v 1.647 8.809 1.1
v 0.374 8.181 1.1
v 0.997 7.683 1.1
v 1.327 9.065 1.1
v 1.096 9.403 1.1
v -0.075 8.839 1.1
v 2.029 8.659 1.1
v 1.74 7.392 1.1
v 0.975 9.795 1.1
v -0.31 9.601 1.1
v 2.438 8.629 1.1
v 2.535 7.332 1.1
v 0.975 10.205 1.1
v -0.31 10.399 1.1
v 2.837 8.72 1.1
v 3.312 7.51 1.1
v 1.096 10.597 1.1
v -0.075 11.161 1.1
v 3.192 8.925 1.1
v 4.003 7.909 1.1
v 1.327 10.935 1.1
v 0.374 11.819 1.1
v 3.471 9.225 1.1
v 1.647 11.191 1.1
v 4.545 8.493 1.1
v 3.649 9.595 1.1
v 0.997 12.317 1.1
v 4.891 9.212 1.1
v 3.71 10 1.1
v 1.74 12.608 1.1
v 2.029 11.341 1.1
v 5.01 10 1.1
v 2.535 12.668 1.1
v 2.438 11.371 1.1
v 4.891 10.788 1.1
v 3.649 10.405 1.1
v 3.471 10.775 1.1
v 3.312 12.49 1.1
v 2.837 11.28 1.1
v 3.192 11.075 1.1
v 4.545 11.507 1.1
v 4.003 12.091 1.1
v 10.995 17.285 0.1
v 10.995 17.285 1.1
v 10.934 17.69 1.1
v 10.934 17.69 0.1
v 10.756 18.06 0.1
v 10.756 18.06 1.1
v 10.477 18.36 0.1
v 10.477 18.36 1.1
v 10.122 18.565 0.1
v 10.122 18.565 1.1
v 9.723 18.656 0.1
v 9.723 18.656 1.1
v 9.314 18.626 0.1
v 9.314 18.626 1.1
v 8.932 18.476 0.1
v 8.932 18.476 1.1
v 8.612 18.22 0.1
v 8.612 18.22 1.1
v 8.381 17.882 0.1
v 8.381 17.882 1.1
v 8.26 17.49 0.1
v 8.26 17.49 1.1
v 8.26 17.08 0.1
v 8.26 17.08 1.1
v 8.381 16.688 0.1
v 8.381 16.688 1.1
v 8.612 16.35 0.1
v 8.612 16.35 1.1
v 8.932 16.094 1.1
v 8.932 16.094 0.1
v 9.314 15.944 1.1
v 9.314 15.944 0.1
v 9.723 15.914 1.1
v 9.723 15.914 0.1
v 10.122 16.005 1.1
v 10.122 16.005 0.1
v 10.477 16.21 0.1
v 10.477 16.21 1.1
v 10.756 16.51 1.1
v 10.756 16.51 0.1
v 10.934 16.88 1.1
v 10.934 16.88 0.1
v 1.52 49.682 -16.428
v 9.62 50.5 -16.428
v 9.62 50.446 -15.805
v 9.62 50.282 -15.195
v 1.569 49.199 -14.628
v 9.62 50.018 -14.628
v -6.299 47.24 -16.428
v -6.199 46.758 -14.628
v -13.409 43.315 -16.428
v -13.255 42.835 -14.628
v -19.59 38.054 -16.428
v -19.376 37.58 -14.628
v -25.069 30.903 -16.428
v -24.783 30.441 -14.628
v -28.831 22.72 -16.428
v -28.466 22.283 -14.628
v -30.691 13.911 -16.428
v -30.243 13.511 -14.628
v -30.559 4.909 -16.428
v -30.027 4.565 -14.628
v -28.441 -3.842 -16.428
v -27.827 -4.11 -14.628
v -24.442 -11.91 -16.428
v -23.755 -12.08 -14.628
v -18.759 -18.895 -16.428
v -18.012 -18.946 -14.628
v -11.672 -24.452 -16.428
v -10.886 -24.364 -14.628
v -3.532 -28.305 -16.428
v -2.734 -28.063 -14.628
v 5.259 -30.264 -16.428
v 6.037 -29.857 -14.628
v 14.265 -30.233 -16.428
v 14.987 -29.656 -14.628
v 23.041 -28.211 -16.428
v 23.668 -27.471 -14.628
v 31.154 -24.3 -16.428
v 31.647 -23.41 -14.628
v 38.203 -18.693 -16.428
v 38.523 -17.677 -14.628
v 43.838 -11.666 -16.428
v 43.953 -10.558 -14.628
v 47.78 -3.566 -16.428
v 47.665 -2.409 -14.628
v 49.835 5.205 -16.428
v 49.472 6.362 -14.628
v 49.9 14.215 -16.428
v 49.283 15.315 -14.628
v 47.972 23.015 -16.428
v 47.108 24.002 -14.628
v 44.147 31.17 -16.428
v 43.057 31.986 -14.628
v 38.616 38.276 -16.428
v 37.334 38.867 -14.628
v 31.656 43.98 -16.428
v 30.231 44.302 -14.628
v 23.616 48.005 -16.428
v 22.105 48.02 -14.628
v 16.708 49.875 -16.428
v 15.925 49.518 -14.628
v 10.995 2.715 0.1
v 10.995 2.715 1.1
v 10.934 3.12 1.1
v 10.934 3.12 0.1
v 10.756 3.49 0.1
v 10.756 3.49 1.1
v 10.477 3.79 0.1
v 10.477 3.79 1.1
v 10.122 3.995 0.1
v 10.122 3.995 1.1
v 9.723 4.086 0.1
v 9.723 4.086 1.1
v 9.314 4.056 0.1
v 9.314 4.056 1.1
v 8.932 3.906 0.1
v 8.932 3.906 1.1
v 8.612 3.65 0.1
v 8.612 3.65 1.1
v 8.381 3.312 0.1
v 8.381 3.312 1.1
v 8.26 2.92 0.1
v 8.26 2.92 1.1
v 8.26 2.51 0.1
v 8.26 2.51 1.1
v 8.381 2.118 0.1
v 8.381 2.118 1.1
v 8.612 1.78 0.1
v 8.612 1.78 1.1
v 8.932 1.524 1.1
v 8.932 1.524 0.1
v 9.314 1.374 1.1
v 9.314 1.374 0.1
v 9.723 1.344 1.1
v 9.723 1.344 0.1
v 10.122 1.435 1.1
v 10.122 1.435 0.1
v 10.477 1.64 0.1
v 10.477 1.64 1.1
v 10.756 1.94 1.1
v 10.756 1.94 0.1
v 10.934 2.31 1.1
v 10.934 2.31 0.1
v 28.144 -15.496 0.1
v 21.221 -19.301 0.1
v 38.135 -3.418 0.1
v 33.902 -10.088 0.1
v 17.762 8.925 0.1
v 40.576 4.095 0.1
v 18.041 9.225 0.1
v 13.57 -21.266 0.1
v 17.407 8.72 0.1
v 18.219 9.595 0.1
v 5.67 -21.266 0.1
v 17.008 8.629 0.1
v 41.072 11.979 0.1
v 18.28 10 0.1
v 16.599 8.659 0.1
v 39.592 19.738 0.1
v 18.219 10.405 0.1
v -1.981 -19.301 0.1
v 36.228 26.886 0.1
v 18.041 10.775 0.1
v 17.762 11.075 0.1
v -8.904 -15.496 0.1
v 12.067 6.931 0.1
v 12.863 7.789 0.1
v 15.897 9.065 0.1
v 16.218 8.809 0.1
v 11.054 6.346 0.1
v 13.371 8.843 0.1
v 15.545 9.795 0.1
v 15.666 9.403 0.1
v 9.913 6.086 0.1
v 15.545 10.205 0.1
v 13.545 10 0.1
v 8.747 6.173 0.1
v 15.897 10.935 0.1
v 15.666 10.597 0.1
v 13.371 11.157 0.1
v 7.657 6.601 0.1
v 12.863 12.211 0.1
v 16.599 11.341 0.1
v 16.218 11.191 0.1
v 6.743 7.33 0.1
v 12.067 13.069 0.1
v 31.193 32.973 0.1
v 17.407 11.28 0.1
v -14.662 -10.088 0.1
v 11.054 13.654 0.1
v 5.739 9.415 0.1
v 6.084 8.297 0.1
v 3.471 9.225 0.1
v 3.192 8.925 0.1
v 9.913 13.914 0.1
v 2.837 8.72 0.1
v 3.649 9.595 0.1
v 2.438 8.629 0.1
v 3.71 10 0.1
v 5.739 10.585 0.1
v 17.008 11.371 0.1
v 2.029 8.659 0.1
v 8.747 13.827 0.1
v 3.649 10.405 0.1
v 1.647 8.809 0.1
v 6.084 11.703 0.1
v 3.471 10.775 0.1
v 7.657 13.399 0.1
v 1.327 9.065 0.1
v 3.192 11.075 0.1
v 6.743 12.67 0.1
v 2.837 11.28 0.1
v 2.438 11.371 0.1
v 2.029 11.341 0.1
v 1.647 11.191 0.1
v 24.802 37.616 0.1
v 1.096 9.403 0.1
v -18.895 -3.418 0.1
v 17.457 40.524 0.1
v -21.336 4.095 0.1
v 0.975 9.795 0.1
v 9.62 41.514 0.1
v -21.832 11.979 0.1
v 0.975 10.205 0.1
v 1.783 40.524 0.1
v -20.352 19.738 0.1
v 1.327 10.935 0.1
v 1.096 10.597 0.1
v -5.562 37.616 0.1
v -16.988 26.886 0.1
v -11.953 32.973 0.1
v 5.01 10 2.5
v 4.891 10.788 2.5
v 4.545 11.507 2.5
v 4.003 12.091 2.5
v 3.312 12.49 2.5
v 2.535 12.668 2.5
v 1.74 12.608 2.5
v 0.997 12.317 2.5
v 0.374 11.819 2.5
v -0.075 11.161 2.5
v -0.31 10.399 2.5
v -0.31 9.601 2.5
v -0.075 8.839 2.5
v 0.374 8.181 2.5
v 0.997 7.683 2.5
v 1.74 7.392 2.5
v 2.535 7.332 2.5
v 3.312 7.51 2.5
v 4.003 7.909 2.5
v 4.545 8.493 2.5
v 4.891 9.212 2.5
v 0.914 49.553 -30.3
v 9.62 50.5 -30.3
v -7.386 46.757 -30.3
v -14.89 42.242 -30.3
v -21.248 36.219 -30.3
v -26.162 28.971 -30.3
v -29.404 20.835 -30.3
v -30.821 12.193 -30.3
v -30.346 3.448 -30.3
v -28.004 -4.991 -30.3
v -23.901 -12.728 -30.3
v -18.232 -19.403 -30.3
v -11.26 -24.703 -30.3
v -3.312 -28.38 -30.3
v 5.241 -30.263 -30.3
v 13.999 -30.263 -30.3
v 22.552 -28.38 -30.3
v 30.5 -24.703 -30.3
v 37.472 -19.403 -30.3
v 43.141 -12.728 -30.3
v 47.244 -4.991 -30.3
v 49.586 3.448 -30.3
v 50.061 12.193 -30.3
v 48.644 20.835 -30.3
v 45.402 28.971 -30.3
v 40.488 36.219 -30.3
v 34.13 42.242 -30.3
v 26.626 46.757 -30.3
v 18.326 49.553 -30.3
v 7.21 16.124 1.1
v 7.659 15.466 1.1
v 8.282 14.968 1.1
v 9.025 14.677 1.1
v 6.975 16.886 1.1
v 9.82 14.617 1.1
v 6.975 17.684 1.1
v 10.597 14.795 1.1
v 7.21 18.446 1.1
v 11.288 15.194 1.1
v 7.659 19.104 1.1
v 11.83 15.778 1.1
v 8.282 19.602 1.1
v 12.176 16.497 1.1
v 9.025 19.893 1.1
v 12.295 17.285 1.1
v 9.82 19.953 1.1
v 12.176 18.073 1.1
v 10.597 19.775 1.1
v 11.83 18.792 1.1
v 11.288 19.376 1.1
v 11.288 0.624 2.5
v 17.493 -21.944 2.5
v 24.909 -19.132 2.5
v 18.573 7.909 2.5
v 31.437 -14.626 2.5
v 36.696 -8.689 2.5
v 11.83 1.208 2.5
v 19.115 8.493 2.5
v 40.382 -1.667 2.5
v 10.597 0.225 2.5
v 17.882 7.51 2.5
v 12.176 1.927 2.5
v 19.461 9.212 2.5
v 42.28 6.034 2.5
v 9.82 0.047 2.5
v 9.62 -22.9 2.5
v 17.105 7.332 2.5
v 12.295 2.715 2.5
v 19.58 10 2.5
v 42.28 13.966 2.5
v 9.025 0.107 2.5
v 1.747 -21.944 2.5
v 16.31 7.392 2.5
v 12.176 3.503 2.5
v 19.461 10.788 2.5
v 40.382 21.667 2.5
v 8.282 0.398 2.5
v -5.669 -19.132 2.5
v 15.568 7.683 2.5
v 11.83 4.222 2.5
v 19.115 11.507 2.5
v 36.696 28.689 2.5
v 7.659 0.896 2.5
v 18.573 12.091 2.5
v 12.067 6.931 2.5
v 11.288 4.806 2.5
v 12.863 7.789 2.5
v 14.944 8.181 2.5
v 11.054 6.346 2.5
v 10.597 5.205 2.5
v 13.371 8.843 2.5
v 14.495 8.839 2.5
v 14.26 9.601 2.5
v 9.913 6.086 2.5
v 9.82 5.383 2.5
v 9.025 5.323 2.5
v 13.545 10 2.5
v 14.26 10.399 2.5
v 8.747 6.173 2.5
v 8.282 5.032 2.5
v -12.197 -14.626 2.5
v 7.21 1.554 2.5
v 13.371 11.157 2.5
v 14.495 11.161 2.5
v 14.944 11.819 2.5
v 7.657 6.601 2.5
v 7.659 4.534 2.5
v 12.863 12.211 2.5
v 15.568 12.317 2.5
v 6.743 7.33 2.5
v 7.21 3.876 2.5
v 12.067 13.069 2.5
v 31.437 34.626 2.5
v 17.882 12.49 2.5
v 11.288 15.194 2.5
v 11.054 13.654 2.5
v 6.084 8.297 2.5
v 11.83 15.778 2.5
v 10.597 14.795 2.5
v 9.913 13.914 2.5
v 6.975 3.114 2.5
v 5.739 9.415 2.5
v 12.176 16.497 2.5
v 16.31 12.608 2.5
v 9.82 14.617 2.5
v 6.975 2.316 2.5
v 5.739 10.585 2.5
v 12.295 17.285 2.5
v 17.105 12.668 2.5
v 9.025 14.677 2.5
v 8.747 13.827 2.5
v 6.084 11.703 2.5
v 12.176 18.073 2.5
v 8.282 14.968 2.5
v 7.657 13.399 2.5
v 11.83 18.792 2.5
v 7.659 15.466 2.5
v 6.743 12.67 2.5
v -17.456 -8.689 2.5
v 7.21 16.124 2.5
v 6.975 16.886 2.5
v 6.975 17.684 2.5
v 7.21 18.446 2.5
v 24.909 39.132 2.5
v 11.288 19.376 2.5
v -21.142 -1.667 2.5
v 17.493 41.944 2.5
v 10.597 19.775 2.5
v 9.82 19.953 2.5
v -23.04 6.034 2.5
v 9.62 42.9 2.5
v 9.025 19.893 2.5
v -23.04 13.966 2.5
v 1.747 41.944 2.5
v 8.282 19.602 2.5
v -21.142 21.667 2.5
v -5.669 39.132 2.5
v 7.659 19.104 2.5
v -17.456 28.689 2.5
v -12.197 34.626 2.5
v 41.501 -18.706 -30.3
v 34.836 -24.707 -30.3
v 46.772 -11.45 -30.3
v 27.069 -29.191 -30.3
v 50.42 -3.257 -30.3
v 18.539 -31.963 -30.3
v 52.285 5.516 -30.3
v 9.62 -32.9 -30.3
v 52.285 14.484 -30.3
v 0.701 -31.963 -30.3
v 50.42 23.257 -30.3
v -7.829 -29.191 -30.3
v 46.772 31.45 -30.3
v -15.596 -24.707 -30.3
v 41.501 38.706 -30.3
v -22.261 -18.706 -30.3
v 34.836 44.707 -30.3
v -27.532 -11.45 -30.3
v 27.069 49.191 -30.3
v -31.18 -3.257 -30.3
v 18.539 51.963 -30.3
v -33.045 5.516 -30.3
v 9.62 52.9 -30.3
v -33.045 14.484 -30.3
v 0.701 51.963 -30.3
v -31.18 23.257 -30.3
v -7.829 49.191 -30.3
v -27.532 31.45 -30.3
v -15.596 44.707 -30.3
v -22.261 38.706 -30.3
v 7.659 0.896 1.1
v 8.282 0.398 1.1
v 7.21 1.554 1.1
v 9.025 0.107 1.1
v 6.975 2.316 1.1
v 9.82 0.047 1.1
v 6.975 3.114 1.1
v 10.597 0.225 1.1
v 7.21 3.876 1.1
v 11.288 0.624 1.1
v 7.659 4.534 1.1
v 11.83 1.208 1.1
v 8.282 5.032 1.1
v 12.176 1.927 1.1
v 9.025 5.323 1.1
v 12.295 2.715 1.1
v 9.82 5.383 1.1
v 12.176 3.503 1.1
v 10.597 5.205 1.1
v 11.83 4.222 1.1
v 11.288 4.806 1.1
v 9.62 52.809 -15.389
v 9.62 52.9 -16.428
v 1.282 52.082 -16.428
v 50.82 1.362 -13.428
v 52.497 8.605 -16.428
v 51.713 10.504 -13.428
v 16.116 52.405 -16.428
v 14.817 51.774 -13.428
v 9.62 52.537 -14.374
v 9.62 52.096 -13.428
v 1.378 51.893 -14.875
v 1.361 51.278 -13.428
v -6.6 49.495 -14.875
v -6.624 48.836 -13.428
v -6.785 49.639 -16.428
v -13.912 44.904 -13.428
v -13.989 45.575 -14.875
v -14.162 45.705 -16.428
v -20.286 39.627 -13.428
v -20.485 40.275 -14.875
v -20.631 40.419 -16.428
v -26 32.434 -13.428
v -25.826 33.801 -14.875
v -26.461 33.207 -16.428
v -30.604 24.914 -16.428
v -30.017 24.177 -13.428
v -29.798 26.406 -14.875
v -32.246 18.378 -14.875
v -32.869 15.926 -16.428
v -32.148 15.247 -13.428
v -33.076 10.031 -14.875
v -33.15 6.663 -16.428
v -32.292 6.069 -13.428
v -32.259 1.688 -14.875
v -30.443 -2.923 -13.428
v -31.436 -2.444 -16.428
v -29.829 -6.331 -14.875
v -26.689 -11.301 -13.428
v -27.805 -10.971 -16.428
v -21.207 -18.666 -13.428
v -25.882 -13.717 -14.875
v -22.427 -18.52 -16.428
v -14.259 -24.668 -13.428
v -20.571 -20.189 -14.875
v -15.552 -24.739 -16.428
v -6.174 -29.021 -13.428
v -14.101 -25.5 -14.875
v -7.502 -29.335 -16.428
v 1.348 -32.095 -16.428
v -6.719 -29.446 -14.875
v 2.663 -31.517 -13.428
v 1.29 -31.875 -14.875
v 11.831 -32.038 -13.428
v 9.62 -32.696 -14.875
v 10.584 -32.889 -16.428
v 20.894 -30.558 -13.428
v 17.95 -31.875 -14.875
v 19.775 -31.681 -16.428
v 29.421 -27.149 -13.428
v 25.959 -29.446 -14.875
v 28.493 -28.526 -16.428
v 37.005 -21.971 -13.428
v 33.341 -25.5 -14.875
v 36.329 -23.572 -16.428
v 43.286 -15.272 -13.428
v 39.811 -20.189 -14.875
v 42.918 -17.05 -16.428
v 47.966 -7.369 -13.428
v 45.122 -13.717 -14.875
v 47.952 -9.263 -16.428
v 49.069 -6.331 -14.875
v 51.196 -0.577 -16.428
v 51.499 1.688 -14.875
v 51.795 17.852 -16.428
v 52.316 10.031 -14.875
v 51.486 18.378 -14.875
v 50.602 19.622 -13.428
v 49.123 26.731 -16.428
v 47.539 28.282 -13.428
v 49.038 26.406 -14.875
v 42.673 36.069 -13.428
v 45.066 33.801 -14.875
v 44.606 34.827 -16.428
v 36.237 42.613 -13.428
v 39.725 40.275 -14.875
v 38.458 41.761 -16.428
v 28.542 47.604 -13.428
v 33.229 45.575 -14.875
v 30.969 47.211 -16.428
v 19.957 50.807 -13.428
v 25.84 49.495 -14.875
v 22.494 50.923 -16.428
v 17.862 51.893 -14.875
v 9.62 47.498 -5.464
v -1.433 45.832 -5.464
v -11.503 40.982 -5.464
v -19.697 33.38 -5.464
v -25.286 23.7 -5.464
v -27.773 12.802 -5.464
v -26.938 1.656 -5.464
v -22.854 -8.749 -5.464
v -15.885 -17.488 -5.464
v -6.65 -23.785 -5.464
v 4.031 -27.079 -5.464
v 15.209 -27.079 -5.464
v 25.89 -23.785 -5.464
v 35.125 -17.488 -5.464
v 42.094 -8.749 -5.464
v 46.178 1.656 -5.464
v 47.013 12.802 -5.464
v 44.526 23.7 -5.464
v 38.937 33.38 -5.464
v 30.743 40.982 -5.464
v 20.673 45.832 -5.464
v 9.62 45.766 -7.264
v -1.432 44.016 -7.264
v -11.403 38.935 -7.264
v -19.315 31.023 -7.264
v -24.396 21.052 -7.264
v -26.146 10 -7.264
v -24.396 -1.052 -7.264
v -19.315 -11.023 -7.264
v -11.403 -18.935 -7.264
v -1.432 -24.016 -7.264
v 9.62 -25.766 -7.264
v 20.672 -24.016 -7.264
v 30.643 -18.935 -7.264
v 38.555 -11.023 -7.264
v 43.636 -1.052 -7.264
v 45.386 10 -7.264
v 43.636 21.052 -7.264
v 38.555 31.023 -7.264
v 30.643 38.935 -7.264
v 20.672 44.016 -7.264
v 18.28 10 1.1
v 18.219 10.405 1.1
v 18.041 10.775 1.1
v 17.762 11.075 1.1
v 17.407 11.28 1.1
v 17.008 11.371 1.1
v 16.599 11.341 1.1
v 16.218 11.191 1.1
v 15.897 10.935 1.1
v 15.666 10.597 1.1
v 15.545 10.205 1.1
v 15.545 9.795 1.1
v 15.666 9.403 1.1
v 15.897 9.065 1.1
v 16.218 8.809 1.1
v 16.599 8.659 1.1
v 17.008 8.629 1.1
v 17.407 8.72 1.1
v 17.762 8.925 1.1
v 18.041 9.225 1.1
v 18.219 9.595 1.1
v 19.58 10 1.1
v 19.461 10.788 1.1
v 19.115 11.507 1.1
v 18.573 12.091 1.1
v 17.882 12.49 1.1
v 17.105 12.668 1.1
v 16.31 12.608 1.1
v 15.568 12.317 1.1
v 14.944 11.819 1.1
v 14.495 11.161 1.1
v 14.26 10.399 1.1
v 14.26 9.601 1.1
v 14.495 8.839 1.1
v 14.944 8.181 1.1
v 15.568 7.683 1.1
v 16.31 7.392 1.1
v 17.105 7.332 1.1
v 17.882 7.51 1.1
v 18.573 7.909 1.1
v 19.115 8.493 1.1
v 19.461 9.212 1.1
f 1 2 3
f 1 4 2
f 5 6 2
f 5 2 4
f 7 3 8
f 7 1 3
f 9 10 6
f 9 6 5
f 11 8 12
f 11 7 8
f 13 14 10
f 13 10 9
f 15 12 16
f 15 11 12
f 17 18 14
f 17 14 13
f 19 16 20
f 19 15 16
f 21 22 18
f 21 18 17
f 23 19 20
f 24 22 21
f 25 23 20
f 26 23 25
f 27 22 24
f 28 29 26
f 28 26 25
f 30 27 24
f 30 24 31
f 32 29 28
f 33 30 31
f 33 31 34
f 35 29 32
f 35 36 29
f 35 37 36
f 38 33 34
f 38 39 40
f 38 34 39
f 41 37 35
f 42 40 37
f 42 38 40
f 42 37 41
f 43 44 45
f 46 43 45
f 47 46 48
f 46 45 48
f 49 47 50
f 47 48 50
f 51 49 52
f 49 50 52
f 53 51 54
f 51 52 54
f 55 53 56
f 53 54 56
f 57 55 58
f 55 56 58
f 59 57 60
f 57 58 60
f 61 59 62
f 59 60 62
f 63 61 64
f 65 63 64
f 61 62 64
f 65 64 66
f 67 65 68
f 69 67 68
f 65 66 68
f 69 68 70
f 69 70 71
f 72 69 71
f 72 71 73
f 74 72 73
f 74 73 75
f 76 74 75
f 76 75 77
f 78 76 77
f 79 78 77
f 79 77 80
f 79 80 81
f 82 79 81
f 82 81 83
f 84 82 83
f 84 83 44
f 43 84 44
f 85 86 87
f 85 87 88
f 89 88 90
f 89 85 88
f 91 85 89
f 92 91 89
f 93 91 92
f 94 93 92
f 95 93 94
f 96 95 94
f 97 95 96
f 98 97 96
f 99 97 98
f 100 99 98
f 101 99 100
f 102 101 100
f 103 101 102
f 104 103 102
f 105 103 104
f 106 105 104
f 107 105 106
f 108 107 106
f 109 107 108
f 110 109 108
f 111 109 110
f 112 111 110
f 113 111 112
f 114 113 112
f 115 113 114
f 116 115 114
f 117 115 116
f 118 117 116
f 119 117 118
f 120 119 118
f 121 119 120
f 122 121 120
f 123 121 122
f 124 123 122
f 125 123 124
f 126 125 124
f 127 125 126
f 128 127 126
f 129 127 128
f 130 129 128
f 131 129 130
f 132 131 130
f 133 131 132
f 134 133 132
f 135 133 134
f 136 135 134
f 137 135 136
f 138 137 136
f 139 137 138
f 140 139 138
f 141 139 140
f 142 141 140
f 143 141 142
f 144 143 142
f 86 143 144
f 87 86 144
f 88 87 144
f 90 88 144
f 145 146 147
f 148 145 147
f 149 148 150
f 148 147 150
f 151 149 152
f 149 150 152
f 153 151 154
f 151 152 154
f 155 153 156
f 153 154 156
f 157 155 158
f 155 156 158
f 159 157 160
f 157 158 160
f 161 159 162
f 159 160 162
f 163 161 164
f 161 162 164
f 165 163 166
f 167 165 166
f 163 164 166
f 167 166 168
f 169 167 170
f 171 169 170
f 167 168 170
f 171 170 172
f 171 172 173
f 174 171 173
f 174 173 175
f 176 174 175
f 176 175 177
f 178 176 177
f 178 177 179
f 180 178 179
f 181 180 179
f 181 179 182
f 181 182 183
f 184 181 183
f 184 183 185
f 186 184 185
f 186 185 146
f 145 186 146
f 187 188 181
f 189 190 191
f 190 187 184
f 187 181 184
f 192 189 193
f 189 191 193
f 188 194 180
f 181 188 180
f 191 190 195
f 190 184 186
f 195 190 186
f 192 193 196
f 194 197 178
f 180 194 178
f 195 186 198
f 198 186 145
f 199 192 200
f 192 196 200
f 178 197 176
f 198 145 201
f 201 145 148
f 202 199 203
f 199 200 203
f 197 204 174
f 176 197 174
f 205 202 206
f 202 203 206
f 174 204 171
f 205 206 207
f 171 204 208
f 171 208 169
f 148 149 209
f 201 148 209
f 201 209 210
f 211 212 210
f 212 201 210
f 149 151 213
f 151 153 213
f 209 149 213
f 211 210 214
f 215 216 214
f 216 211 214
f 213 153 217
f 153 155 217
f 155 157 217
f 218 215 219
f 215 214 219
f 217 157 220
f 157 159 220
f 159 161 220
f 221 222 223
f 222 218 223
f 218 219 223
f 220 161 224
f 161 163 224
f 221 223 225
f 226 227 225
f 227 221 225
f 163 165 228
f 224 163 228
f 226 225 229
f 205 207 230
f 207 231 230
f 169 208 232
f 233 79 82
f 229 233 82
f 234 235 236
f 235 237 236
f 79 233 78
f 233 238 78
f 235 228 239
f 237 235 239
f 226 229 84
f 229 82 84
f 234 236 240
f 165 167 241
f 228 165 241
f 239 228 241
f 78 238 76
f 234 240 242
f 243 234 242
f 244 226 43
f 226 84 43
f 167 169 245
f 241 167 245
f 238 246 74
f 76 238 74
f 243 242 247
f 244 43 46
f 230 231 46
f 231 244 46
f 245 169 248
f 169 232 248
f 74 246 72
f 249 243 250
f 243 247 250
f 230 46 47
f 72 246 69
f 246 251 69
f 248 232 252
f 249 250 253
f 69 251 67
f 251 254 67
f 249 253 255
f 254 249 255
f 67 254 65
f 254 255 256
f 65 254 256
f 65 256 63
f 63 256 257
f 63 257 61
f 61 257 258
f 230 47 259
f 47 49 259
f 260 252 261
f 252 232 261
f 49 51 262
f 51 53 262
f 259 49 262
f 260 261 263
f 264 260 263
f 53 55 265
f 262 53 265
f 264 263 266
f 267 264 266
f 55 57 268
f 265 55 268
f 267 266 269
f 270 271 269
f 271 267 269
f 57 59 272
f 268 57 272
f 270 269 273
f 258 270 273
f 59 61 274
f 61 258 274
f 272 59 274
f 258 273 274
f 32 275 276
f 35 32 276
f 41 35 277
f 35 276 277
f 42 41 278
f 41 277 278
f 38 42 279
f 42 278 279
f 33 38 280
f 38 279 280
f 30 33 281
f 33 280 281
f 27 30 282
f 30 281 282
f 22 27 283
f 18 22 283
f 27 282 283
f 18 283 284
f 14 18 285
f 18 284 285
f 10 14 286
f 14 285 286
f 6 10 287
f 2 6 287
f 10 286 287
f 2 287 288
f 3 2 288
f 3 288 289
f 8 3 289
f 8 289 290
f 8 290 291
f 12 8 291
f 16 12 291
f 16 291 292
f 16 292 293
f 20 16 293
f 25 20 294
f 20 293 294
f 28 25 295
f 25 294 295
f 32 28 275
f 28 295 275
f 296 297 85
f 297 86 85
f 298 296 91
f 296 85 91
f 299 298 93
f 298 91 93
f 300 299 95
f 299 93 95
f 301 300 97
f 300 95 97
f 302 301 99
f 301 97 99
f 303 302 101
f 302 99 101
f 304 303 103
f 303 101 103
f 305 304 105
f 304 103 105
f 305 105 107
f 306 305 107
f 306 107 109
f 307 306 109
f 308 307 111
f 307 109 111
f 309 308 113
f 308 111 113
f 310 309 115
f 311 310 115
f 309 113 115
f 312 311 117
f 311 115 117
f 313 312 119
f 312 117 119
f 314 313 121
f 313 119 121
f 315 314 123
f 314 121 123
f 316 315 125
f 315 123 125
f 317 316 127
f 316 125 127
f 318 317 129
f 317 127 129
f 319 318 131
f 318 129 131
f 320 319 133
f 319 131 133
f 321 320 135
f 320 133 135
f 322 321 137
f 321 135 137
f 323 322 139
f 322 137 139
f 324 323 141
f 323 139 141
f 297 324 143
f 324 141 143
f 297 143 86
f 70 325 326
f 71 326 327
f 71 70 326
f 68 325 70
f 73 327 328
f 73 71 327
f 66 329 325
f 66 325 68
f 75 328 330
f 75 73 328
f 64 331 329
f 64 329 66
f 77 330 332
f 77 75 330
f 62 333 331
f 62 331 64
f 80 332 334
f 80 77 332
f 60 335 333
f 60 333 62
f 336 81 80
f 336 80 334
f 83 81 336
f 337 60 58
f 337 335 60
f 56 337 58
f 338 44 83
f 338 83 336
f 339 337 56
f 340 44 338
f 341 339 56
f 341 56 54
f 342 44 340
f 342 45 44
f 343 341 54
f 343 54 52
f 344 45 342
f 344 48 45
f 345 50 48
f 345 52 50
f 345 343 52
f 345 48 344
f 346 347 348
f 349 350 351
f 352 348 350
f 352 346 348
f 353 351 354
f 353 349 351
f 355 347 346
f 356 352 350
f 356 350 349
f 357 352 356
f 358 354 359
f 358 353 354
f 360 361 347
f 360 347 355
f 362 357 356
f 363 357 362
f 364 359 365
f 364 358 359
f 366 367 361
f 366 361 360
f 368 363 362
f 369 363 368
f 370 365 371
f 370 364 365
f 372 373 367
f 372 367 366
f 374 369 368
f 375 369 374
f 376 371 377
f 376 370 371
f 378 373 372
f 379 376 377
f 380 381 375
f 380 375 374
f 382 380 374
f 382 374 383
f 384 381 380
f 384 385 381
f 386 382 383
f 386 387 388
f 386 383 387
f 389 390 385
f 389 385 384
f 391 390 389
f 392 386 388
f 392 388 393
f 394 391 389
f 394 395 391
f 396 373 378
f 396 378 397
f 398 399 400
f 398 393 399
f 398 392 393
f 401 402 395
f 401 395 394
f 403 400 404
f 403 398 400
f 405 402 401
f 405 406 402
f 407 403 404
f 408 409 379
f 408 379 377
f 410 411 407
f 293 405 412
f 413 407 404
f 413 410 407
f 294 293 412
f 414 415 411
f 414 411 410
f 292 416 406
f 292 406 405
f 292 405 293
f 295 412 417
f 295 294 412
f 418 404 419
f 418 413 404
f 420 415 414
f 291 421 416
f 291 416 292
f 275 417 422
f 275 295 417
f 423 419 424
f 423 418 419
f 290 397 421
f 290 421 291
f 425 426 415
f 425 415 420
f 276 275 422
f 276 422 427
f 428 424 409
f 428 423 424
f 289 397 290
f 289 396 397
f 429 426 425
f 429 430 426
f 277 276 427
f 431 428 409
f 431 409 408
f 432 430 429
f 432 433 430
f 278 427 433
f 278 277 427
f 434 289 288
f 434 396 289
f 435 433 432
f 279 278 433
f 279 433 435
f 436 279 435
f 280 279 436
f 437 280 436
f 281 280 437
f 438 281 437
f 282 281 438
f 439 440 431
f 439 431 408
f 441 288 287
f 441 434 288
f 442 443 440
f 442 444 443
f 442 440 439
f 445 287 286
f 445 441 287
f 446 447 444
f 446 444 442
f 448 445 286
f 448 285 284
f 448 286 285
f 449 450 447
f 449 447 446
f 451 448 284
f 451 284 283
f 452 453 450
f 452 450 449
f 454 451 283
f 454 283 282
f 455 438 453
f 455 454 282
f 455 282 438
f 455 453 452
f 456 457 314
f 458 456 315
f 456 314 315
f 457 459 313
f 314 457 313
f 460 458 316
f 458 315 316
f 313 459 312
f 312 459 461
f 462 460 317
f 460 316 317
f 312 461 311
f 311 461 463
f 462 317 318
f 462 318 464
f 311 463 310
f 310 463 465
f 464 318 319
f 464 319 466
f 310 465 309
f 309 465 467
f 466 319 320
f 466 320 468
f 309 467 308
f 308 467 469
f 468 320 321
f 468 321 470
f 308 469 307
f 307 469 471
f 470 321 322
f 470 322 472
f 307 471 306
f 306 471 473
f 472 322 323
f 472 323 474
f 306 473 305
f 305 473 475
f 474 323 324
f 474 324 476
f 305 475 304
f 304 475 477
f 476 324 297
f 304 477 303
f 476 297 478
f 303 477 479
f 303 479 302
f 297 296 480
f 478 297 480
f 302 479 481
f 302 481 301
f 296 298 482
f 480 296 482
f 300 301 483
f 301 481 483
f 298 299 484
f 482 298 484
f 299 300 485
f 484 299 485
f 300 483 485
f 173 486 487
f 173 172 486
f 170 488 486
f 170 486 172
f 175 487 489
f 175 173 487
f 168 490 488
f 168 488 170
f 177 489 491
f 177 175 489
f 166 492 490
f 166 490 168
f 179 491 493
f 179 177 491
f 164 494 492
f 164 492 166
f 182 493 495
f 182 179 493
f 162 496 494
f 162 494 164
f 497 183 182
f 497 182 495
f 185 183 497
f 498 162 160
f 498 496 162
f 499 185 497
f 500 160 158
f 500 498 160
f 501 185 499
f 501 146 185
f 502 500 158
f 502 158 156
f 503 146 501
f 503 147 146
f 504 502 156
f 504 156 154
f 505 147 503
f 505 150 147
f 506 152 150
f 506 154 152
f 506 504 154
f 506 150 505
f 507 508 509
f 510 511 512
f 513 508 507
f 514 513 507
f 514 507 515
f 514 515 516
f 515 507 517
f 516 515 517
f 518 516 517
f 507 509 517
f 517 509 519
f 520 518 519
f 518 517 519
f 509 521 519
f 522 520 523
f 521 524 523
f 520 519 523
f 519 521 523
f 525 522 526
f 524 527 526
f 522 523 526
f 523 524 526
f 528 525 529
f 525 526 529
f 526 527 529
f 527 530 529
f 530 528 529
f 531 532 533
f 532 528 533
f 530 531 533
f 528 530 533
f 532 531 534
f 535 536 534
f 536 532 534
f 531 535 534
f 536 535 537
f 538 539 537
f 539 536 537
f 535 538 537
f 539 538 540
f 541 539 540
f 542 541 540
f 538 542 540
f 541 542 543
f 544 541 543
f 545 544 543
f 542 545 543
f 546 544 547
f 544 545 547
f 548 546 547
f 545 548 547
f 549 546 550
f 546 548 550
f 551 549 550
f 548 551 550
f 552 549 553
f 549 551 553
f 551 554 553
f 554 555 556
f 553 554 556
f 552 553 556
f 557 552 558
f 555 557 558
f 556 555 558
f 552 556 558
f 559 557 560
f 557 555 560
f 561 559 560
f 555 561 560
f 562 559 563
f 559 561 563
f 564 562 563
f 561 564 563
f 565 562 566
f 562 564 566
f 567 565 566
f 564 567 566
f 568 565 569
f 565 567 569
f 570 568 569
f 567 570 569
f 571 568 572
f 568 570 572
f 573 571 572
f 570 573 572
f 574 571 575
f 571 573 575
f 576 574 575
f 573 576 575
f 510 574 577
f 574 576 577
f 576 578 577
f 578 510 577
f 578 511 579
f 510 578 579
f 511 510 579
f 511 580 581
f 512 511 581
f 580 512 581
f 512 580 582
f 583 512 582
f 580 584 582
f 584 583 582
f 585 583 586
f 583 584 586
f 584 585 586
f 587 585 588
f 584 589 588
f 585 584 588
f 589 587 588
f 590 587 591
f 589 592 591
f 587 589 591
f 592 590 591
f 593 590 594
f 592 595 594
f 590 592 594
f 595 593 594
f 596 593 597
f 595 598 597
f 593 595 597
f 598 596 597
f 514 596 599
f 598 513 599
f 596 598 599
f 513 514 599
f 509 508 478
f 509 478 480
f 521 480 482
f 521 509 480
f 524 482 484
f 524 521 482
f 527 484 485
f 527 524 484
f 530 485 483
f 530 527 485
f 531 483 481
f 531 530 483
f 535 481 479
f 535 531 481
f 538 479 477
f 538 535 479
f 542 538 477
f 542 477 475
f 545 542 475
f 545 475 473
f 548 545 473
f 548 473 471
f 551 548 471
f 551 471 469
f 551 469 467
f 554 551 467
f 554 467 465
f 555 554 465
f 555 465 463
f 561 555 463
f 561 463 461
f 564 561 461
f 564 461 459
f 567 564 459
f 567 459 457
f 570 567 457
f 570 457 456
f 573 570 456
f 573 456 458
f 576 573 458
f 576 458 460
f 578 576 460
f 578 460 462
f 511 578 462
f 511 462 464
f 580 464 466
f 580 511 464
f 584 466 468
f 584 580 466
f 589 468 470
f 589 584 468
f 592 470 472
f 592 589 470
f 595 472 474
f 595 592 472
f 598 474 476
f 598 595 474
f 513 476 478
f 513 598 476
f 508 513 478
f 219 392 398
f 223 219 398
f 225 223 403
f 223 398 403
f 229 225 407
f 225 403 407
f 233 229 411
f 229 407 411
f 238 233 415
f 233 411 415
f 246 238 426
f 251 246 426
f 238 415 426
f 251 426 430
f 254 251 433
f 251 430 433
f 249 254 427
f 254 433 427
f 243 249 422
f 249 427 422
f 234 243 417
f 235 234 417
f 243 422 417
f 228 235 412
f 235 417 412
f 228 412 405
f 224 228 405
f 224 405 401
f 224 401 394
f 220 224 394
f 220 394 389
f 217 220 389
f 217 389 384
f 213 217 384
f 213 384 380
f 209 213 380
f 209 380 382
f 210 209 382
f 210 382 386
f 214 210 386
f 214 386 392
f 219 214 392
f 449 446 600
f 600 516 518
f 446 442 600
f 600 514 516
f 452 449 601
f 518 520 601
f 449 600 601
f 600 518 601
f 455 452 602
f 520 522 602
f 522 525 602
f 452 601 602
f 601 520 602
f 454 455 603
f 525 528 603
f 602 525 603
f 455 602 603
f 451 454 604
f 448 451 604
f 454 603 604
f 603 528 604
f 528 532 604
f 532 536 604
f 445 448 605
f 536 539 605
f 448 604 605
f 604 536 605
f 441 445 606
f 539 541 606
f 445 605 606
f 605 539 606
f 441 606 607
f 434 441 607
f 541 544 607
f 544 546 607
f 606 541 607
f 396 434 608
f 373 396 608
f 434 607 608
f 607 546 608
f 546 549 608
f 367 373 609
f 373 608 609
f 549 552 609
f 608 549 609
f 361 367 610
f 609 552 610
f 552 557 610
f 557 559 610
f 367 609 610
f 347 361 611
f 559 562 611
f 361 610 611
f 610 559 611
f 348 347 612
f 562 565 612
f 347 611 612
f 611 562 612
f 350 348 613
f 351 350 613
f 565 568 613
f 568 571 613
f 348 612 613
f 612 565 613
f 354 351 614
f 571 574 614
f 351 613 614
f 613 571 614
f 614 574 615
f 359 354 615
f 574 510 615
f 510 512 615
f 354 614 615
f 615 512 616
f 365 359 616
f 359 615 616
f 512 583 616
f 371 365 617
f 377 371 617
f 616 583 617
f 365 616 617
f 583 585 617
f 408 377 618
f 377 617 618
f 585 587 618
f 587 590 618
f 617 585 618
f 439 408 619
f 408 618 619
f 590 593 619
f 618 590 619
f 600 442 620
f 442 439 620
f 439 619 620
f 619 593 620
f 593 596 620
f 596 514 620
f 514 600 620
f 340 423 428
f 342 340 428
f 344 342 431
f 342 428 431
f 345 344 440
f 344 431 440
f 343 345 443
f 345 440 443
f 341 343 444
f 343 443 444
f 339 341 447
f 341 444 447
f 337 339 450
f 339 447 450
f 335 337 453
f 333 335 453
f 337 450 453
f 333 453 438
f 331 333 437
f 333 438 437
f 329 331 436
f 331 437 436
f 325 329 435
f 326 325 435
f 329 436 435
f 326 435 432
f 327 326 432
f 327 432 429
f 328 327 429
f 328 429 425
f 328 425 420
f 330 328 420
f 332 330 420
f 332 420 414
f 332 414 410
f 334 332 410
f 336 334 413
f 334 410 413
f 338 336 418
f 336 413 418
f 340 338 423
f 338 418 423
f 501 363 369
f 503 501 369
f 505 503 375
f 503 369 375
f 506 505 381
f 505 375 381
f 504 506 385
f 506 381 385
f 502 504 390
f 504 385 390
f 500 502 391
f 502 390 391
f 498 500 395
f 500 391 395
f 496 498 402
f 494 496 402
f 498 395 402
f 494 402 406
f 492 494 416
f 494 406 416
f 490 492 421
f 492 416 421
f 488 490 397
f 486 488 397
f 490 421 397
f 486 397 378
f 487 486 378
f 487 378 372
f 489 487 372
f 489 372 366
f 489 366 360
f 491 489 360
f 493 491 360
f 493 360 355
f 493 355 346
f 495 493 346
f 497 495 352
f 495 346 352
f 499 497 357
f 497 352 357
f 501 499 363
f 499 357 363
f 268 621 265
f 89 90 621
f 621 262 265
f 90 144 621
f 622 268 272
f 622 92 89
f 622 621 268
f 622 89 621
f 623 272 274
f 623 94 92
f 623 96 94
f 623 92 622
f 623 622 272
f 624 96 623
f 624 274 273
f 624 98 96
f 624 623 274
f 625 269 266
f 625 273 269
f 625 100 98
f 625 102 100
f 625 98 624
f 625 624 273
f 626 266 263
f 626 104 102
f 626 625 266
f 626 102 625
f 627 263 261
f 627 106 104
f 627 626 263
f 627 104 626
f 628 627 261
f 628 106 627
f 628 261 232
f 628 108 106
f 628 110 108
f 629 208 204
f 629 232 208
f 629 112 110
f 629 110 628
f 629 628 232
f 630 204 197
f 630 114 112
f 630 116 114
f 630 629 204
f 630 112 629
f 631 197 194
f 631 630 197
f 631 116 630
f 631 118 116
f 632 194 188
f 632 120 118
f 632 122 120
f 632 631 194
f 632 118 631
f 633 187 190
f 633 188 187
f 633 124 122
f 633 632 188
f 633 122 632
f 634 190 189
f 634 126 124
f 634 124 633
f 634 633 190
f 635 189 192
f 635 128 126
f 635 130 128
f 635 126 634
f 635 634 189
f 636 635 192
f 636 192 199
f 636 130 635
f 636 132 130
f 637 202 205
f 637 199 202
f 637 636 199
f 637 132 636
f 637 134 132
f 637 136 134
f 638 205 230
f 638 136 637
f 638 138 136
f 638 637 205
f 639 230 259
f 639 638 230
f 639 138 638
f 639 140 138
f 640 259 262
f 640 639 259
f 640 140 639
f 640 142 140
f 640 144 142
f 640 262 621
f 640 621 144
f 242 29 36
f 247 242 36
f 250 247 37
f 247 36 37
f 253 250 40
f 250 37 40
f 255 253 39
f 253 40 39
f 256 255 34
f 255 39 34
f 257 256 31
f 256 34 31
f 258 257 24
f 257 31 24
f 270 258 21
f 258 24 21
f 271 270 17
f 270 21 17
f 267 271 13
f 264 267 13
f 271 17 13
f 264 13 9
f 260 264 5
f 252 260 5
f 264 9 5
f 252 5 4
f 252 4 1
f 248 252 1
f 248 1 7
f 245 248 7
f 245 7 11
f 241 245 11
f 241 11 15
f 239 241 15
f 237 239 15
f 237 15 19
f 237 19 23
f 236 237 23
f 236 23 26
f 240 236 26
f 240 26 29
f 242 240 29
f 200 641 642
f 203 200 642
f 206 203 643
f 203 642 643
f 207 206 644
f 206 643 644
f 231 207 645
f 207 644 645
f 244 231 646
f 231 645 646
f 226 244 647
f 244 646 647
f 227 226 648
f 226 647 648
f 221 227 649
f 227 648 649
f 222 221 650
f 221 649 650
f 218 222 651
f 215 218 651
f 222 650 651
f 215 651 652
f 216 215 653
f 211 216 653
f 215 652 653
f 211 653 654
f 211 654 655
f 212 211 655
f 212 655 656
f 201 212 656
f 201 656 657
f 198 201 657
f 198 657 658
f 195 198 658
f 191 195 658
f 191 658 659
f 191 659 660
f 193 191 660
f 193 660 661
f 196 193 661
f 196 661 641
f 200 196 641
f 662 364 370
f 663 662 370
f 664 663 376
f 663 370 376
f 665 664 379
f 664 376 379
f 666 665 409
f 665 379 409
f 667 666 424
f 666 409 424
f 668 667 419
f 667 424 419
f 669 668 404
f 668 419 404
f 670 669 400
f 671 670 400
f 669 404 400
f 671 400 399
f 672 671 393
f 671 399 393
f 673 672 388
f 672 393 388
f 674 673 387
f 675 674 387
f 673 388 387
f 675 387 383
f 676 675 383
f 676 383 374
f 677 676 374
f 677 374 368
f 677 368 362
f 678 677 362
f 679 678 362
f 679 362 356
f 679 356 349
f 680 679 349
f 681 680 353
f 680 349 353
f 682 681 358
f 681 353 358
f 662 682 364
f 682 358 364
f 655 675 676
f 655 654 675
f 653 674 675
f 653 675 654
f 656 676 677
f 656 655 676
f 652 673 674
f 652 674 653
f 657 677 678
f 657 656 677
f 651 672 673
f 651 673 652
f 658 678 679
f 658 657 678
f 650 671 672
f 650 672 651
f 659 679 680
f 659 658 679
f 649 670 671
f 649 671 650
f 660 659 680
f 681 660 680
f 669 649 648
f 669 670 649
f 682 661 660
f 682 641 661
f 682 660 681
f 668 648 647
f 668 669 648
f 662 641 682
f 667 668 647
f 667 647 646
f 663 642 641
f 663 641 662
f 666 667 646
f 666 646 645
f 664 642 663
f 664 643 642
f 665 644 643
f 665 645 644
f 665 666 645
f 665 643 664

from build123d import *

# Parameters (mm, degrees)
SKETCH1_R                = 42.9
BOSS_EXTRUDE1_DEPTH      = 2.5
BOSS_EXTRUDE1_DEPTH_BACK = 30.3
CHAMFER1_SIZE            = 10
CHAMFER1_SIZE2           = 17.320508076
FILLET1_R                = 6
SHELL1_T                 = -2.4
CUT_EXTRUDE1_REACH       = 83.441
SKETCH2_R                = 3.925
SKETCH2_R_2              = 1.375
SKETCH3_R                = 2.675
CUT_EXTRUDE2_DEPTH       = 1.4


with BuildPart() as part:
    # Sketch1 → Boss-Extrude1 (new, two sides)
    with BuildSketch(Plane.XY) as boss_extrude1_sk:
        with Locations(Location((9.62, 10, 0), (0, 0, 90))):
            Circle(SKETCH1_R)
    extrude(amount=BOSS_EXTRUDE1_DEPTH)
    extrude(boss_extrude1_sk.sketch, amount=-BOSS_EXTRUDE1_DEPTH_BACK)

    # Chamfer1
    chamfer1_edges = [part.edges().sort_by_distance(p)[0] for p in [
        (9.62, -32.9, 2.5),
    ]]
    chamfer1_side = [part.faces().sort_by_distance(p)[0] for p in [
        (9.62, 10, 2.5),
    ]]
    chamfer(chamfer1_edges, length=CHAMFER1_SIZE, length2=CHAMFER1_SIZE2, reference=chamfer1_side[0])

    # Fillet1
    fillet1_edges = [part.edges().sort_by_distance(p)[0] for p in [
        (9.62, -32.9, -14.820508076),
    ]]
    fillet(fillet1_edges, radius=FILLET1_R)

    # Shell1
    shell1_openings = [part.faces().sort_by_distance(p)[0] for p in [
        (9.62, 10, -30.3),
    ]]
    offset(amount=SHELL1_T, openings=shell1_openings, kind=Kind.INTERSECTION)

    # Sketch2 → Cut-Extrude1 (cut, up to next)
    with BuildSketch(Plane.XY.offset(2.5), mode=Mode.PRIVATE) as cut_extrude1_sk1:
        with Locations((9.62, 10)):
            Circle(SKETCH2_R)
    cut_extrude1_tool1 = extrude(cut_extrude1_sk1.sketch, amount=-CUT_EXTRUDE1_REACH, mode=Mode.PRIVATE) & part.part
    # Sketch2 → Cut-Extrude1 (cut, up to next)
    with BuildSketch(Plane.XY.offset(2.5), mode=Mode.PRIVATE) as cut_extrude1_sk2:
        with Locations((9.62, 17.285)):
            Circle(SKETCH2_R_2)
    cut_extrude1_tool2 = extrude(cut_extrude1_sk2.sketch, amount=-CUT_EXTRUDE1_REACH, mode=Mode.PRIVATE) & part.part
    # Sketch2 → Cut-Extrude1 (cut, up to next)
    with BuildSketch(Plane.XY.offset(2.5), mode=Mode.PRIVATE) as cut_extrude1_sk3:
        with Locations((9.62, 2.715)):
            Circle(SKETCH2_R_2)
    cut_extrude1_tool3 = extrude(cut_extrude1_sk3.sketch, amount=-CUT_EXTRUDE1_REACH, mode=Mode.PRIVATE) & part.part
    # Sketch2 → Cut-Extrude1 (cut, up to next)
    with BuildSketch(Plane.XY.offset(2.5), mode=Mode.PRIVATE) as cut_extrude1_sk4:
        with Locations((2.335, 10)):
            Circle(SKETCH2_R_2)
    cut_extrude1_tool4 = extrude(cut_extrude1_sk4.sketch, amount=-CUT_EXTRUDE1_REACH, mode=Mode.PRIVATE) & part.part
    # Sketch2 → Cut-Extrude1 (cut, up to next)
    with BuildSketch(Plane.XY.offset(2.5), mode=Mode.PRIVATE) as cut_extrude1_sk5:
        with Locations((16.905, 10)):
            Circle(SKETCH2_R_2)
    cut_extrude1_tool5 = extrude(cut_extrude1_sk5.sketch, amount=-CUT_EXTRUDE1_REACH, mode=Mode.PRIVATE) & part.part
    add(cut_extrude1_tool1.solids().sort_by_distance((9.62, 10, 2.5))[0], mode=Mode.SUBTRACT)
    add(cut_extrude1_tool2.solids().sort_by_distance((9.62, 17.285, 2.5))[0], mode=Mode.SUBTRACT)
    add(cut_extrude1_tool3.solids().sort_by_distance((9.62, 2.715, 2.5))[0], mode=Mode.SUBTRACT)
    add(cut_extrude1_tool4.solids().sort_by_distance((2.335, 10, 2.5))[0], mode=Mode.SUBTRACT)
    add(cut_extrude1_tool5.solids().sort_by_distance((16.905, 10, 2.5))[0], mode=Mode.SUBTRACT)

    # Sketch3 → Cut-Extrude2 (cut)
    with BuildSketch(Plane.XY.offset(2.5)):
        with Locations((2.335, 10)):
            Circle(SKETCH3_R)
        with Locations((9.62, 2.715)):
            Circle(SKETCH3_R)
        with Locations((9.62, 17.285)):
            Circle(SKETCH3_R)
        with Locations((16.905, 10)):
            Circle(SKETCH3_R)
    extrude(amount=-CUT_EXTRUDE2_DEPTH, mode=Mode.SUBTRACT)


solid = part.part
